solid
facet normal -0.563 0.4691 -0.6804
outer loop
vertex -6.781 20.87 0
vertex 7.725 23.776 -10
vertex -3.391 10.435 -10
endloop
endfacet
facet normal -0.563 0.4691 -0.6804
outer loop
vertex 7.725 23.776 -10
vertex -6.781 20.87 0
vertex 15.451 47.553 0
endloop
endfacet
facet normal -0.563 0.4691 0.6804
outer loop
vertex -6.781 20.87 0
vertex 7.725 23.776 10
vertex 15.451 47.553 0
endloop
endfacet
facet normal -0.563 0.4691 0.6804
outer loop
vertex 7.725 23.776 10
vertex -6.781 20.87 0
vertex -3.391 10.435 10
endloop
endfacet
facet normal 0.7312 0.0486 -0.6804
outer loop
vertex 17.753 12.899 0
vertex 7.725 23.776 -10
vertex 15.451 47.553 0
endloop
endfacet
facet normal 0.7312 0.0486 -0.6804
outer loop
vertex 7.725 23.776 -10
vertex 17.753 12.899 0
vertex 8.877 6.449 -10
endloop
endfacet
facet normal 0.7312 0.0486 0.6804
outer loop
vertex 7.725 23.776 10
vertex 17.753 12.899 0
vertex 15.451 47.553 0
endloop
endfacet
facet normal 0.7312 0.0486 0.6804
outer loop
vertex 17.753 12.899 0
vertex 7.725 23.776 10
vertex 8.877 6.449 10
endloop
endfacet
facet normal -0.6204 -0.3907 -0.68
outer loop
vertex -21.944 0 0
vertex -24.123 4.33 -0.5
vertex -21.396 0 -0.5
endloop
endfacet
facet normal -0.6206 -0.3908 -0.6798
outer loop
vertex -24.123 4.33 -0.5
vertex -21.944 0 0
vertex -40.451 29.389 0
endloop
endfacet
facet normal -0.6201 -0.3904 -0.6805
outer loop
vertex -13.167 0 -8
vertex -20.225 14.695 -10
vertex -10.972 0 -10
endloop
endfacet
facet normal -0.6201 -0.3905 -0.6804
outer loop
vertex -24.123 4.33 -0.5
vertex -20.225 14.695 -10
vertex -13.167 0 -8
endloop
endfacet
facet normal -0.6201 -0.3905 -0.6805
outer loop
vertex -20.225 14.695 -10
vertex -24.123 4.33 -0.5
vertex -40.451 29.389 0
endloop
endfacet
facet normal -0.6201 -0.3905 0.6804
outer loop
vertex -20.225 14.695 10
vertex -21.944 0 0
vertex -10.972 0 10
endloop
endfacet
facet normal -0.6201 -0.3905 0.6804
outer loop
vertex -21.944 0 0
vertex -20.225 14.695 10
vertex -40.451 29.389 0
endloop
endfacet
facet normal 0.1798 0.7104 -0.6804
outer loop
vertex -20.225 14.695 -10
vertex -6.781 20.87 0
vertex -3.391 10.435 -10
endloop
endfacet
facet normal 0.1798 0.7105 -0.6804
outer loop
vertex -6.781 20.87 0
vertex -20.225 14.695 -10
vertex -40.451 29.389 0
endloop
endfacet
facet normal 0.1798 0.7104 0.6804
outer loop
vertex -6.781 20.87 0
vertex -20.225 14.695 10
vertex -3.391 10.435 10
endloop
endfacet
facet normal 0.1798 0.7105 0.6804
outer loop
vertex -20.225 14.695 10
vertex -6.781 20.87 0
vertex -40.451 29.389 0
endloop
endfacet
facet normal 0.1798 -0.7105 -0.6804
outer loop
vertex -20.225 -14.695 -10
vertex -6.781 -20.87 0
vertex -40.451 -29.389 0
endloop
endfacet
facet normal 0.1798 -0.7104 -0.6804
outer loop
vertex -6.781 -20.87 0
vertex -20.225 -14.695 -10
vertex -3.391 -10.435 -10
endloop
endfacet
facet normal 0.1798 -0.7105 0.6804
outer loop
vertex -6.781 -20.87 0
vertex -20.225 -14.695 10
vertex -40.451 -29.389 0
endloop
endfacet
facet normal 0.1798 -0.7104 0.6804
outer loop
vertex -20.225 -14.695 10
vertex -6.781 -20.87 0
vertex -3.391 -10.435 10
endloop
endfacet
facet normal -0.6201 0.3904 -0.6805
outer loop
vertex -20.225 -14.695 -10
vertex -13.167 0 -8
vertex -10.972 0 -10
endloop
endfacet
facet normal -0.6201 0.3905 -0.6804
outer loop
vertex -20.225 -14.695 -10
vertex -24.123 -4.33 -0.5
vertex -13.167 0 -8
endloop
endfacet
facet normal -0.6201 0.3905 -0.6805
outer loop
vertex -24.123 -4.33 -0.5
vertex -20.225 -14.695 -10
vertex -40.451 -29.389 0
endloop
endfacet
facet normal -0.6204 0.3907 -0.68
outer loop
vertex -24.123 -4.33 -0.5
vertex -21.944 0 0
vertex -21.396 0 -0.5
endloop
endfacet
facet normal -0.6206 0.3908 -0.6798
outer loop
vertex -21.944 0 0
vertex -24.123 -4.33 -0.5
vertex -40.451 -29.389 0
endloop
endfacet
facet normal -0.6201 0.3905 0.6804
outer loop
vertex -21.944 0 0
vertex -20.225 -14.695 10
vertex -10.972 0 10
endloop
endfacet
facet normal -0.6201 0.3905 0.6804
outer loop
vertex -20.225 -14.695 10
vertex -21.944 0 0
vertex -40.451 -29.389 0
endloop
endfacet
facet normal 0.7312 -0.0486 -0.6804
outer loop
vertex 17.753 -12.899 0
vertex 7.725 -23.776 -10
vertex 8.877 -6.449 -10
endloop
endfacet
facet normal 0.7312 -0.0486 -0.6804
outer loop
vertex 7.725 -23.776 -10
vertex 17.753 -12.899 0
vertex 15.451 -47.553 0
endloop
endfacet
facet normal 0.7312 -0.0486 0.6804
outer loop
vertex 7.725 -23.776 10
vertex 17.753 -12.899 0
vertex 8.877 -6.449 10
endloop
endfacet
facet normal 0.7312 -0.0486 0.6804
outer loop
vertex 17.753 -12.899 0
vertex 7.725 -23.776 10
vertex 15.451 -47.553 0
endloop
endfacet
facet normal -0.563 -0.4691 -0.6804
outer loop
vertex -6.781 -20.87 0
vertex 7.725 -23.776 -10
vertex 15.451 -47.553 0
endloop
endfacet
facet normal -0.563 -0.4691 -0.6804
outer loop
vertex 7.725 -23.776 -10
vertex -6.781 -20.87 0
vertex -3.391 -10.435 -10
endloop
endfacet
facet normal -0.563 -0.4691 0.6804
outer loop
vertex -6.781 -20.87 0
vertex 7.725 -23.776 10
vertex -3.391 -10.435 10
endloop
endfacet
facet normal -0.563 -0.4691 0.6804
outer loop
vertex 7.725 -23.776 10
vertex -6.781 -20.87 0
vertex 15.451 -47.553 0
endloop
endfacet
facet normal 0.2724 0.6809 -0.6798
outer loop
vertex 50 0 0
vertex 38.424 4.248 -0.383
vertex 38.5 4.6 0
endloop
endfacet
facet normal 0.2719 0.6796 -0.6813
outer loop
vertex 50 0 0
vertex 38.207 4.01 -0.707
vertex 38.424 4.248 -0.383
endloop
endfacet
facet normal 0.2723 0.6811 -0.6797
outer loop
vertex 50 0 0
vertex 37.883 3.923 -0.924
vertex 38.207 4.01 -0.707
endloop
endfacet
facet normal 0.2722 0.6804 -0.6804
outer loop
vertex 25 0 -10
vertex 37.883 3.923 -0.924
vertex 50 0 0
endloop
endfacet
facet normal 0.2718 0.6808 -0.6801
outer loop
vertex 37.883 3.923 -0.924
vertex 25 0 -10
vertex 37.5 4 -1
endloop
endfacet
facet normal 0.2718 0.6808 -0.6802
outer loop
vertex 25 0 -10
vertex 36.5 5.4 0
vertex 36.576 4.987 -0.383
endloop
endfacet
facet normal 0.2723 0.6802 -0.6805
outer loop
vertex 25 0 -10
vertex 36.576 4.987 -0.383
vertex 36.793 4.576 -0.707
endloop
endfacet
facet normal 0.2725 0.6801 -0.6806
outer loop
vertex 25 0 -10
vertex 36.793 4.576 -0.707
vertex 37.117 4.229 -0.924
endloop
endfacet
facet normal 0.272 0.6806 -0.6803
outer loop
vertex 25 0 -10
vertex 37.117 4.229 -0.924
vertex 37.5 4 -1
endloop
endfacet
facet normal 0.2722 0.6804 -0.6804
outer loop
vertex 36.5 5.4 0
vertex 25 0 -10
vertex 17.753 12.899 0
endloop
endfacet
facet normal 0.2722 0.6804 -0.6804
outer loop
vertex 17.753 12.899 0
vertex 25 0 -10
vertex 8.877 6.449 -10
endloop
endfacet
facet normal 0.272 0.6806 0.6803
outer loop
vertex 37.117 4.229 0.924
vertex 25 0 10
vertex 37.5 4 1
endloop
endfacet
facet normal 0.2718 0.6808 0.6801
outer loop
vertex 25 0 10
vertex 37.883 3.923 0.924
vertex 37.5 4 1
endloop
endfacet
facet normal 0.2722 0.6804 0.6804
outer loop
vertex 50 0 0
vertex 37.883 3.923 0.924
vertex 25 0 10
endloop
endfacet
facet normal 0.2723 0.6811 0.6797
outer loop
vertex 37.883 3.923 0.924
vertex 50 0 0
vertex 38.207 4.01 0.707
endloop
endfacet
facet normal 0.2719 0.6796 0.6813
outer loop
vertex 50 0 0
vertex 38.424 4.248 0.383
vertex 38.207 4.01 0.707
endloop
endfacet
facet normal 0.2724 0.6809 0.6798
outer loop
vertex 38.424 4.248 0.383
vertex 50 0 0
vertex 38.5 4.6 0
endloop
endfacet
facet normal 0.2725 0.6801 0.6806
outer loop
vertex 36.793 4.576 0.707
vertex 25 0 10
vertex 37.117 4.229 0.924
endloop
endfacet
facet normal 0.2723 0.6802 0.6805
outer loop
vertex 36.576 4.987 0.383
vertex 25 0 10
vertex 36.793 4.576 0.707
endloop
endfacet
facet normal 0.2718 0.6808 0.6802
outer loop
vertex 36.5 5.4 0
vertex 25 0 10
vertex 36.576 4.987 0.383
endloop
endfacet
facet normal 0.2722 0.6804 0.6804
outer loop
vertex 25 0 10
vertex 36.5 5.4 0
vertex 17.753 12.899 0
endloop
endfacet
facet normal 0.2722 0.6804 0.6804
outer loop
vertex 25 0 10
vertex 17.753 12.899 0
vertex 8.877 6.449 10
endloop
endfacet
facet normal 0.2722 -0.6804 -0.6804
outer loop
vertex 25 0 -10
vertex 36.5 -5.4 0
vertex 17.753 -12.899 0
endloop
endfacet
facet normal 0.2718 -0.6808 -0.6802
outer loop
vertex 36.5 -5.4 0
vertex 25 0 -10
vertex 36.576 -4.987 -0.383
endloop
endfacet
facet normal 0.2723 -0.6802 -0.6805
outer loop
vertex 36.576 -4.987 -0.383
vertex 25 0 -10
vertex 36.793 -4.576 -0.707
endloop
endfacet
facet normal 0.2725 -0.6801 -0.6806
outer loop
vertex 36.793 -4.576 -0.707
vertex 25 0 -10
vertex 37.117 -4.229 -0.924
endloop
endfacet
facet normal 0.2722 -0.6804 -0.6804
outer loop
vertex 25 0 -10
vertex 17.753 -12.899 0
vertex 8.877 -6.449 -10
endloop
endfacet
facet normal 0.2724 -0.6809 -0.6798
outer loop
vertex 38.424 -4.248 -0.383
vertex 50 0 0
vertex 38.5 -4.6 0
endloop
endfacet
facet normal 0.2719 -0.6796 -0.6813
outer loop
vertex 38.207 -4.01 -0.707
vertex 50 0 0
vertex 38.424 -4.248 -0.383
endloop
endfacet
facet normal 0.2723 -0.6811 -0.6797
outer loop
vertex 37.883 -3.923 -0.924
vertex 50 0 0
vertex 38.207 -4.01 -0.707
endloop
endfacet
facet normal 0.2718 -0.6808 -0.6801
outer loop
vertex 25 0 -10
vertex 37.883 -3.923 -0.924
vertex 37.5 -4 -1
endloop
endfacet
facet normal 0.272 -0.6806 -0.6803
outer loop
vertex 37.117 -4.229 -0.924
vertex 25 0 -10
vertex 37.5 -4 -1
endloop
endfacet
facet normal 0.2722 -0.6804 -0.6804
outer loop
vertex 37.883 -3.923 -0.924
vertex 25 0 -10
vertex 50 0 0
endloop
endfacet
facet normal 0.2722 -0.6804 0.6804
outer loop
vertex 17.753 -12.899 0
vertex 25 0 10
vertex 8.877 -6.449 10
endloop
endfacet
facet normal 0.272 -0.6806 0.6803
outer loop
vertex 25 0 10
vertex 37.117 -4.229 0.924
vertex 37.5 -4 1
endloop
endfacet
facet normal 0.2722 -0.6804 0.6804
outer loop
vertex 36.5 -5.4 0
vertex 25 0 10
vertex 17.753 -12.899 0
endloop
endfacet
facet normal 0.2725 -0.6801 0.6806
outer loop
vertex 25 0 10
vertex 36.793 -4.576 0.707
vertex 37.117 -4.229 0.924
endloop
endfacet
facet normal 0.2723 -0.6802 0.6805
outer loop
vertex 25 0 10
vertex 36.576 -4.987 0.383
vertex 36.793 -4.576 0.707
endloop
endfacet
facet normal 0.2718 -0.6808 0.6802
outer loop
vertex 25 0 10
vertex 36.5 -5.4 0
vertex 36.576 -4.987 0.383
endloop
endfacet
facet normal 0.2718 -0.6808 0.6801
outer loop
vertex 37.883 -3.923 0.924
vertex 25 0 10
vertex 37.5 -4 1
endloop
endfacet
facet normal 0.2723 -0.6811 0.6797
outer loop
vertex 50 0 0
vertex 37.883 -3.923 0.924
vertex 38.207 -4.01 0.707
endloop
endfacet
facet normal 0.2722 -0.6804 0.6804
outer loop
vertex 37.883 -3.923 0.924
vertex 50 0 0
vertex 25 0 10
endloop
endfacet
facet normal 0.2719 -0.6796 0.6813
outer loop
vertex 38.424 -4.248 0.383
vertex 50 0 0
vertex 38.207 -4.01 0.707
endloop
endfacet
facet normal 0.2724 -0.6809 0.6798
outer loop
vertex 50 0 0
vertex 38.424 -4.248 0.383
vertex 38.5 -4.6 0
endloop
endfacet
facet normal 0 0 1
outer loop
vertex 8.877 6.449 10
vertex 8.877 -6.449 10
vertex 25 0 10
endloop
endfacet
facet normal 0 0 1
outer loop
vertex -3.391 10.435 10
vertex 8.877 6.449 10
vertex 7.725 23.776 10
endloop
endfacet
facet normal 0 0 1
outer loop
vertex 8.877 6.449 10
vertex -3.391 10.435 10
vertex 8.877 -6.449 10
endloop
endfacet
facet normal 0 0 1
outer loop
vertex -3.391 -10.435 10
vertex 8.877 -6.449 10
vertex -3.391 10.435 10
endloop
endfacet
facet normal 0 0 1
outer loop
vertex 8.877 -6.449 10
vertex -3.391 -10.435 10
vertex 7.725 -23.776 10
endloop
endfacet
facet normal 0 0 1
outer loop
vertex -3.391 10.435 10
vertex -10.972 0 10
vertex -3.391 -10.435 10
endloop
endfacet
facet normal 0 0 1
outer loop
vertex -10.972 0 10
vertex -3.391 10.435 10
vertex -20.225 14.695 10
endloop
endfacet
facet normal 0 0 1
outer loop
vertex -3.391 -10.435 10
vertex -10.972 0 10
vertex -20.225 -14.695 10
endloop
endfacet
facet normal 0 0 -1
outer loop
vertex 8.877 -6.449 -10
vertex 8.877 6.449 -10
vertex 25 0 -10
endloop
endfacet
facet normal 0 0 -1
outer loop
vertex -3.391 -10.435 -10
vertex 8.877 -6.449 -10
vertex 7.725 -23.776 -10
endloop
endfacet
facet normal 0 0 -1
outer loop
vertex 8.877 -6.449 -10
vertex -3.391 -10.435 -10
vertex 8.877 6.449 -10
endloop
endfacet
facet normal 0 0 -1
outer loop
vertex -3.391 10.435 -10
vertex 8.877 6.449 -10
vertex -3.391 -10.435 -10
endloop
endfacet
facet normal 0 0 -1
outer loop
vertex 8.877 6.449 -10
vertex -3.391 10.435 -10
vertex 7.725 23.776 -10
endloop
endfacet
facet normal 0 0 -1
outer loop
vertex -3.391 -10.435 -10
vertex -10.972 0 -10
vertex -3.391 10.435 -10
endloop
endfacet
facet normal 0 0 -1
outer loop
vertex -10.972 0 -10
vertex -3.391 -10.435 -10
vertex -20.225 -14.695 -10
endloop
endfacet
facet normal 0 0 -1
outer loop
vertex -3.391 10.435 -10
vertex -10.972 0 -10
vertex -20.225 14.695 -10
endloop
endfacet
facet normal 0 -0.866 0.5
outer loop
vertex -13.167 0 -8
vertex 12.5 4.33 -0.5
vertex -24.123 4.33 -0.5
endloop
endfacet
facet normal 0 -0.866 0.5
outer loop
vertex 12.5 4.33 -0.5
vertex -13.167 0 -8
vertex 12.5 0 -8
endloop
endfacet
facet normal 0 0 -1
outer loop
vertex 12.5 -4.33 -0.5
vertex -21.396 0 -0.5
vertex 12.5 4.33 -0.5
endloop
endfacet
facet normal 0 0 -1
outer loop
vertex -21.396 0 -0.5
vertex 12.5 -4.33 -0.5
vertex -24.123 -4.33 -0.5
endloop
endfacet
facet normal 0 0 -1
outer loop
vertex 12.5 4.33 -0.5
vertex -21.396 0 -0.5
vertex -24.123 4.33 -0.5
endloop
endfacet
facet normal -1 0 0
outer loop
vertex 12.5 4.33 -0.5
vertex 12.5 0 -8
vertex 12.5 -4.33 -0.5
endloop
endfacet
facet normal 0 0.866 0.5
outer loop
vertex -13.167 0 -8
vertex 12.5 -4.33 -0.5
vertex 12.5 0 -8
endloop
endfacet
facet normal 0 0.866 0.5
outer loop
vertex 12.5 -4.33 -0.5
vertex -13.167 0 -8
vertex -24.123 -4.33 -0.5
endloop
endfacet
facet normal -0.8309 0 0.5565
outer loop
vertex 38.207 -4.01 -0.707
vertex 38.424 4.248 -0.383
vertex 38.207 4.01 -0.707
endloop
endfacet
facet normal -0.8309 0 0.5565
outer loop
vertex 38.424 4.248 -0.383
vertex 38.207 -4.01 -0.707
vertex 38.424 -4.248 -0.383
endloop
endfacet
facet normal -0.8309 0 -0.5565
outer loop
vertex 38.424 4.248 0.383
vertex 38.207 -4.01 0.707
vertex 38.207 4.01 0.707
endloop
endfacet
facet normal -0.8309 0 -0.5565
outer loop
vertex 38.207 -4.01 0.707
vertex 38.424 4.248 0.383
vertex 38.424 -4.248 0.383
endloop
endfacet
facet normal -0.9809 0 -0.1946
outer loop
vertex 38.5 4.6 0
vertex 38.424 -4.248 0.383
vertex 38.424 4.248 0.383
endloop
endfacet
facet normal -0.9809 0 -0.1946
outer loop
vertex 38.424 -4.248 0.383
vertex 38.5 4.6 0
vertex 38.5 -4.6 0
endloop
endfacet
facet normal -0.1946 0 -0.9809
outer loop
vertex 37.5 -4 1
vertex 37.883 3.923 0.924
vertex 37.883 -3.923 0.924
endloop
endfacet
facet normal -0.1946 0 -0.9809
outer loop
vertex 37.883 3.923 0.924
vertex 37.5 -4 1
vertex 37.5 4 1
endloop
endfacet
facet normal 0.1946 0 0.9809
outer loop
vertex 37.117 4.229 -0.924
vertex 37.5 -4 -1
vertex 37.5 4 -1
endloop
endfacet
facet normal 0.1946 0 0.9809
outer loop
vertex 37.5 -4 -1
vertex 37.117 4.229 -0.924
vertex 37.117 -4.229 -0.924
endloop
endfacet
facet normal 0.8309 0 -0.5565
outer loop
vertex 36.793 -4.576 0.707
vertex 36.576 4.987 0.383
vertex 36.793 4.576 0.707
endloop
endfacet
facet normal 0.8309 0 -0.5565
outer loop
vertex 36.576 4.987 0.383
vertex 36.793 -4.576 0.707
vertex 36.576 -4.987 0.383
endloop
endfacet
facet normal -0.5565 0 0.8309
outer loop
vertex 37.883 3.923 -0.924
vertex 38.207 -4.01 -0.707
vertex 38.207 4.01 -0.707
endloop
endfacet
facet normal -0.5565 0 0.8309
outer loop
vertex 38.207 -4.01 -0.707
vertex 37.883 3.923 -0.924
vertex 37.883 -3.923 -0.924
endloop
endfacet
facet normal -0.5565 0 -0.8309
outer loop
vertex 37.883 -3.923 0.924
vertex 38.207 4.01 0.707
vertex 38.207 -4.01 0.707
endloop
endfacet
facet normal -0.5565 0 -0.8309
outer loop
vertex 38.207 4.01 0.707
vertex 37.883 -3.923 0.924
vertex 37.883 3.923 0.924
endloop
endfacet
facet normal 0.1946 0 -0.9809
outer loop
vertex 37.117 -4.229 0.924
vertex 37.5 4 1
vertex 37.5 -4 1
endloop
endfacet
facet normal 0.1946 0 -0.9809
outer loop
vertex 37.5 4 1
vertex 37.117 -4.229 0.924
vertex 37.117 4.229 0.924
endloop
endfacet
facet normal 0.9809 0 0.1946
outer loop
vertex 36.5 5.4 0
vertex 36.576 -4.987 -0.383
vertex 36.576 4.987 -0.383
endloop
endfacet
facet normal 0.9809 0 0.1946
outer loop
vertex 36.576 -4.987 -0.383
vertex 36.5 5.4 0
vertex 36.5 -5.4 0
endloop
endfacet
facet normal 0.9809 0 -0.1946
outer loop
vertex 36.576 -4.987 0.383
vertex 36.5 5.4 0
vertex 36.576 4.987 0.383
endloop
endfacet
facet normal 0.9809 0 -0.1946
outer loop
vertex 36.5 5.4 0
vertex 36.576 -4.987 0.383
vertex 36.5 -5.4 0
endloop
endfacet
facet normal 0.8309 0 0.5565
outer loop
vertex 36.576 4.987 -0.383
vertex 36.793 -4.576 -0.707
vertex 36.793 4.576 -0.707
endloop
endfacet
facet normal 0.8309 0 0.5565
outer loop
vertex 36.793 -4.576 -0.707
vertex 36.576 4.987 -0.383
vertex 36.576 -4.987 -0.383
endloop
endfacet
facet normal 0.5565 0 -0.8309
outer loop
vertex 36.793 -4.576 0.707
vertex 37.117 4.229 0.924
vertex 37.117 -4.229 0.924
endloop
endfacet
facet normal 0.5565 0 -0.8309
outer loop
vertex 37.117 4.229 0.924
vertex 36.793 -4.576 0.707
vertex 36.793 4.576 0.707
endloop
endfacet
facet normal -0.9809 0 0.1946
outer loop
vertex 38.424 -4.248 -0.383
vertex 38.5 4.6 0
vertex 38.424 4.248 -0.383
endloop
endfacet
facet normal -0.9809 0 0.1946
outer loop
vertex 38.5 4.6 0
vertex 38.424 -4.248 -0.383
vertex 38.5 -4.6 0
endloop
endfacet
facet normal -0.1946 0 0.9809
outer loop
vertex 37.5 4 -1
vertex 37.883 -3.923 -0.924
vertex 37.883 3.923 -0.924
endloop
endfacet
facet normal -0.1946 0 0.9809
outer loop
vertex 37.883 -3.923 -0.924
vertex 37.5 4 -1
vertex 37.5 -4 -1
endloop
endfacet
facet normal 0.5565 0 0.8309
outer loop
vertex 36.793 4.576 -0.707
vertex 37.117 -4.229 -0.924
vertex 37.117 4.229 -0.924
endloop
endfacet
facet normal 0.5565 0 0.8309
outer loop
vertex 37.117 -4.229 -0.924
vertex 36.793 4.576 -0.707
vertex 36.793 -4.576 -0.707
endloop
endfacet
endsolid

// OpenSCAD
//StarMaker
//by Alex Tanchoco (LionAlex)
//December 9, 2013
//Originally designed for making Christmas tree ornaments but can be adopted for making all kinds of stars


star_points = 5;
star_thickness = 20;
point_length = 50;
point_width = 20;
point_thickness = 5;
point_points = 4;
post_diameter = 10;
post_sides = 3;
each_angle = 180/point_points;
mounting_post = true;
thread_hole = true;


difference() {
	intersection() {
		star();
		if( star_thickness>0 )
		cube( [point_length*3,point_length*3,star_thickness], center=true );
	}
	//mounting post
	if( mounting_post )
		translate( [-point_length*0.25,0,-post_diameter/2+2] )
			rotate( [0,90,0] )
				cylinder( h=point_length,r=post_diameter/2,$fn=post_sides, center = true );

	//thread hole
	if( thread_hole )
		translate( [point_length*0.75,0,0] )
			rotate( [90,0,0] )
				cylinder( h=point_length,r=1,$fn=16, center = true );	
}

module star(star_scale=1) {
	scale( [star_scale,star_scale,star_scale] )
	for( i=[1:1:star_points] ) {
		rotate( [0,0,360/star_points * i] )
			translate( [point_length/2,0,0] )
				rotate( [0,90,0] )
				cylinder( h=point_length, r1=point_width, r2=0, $fn = point_points, center=true );
	}
}
